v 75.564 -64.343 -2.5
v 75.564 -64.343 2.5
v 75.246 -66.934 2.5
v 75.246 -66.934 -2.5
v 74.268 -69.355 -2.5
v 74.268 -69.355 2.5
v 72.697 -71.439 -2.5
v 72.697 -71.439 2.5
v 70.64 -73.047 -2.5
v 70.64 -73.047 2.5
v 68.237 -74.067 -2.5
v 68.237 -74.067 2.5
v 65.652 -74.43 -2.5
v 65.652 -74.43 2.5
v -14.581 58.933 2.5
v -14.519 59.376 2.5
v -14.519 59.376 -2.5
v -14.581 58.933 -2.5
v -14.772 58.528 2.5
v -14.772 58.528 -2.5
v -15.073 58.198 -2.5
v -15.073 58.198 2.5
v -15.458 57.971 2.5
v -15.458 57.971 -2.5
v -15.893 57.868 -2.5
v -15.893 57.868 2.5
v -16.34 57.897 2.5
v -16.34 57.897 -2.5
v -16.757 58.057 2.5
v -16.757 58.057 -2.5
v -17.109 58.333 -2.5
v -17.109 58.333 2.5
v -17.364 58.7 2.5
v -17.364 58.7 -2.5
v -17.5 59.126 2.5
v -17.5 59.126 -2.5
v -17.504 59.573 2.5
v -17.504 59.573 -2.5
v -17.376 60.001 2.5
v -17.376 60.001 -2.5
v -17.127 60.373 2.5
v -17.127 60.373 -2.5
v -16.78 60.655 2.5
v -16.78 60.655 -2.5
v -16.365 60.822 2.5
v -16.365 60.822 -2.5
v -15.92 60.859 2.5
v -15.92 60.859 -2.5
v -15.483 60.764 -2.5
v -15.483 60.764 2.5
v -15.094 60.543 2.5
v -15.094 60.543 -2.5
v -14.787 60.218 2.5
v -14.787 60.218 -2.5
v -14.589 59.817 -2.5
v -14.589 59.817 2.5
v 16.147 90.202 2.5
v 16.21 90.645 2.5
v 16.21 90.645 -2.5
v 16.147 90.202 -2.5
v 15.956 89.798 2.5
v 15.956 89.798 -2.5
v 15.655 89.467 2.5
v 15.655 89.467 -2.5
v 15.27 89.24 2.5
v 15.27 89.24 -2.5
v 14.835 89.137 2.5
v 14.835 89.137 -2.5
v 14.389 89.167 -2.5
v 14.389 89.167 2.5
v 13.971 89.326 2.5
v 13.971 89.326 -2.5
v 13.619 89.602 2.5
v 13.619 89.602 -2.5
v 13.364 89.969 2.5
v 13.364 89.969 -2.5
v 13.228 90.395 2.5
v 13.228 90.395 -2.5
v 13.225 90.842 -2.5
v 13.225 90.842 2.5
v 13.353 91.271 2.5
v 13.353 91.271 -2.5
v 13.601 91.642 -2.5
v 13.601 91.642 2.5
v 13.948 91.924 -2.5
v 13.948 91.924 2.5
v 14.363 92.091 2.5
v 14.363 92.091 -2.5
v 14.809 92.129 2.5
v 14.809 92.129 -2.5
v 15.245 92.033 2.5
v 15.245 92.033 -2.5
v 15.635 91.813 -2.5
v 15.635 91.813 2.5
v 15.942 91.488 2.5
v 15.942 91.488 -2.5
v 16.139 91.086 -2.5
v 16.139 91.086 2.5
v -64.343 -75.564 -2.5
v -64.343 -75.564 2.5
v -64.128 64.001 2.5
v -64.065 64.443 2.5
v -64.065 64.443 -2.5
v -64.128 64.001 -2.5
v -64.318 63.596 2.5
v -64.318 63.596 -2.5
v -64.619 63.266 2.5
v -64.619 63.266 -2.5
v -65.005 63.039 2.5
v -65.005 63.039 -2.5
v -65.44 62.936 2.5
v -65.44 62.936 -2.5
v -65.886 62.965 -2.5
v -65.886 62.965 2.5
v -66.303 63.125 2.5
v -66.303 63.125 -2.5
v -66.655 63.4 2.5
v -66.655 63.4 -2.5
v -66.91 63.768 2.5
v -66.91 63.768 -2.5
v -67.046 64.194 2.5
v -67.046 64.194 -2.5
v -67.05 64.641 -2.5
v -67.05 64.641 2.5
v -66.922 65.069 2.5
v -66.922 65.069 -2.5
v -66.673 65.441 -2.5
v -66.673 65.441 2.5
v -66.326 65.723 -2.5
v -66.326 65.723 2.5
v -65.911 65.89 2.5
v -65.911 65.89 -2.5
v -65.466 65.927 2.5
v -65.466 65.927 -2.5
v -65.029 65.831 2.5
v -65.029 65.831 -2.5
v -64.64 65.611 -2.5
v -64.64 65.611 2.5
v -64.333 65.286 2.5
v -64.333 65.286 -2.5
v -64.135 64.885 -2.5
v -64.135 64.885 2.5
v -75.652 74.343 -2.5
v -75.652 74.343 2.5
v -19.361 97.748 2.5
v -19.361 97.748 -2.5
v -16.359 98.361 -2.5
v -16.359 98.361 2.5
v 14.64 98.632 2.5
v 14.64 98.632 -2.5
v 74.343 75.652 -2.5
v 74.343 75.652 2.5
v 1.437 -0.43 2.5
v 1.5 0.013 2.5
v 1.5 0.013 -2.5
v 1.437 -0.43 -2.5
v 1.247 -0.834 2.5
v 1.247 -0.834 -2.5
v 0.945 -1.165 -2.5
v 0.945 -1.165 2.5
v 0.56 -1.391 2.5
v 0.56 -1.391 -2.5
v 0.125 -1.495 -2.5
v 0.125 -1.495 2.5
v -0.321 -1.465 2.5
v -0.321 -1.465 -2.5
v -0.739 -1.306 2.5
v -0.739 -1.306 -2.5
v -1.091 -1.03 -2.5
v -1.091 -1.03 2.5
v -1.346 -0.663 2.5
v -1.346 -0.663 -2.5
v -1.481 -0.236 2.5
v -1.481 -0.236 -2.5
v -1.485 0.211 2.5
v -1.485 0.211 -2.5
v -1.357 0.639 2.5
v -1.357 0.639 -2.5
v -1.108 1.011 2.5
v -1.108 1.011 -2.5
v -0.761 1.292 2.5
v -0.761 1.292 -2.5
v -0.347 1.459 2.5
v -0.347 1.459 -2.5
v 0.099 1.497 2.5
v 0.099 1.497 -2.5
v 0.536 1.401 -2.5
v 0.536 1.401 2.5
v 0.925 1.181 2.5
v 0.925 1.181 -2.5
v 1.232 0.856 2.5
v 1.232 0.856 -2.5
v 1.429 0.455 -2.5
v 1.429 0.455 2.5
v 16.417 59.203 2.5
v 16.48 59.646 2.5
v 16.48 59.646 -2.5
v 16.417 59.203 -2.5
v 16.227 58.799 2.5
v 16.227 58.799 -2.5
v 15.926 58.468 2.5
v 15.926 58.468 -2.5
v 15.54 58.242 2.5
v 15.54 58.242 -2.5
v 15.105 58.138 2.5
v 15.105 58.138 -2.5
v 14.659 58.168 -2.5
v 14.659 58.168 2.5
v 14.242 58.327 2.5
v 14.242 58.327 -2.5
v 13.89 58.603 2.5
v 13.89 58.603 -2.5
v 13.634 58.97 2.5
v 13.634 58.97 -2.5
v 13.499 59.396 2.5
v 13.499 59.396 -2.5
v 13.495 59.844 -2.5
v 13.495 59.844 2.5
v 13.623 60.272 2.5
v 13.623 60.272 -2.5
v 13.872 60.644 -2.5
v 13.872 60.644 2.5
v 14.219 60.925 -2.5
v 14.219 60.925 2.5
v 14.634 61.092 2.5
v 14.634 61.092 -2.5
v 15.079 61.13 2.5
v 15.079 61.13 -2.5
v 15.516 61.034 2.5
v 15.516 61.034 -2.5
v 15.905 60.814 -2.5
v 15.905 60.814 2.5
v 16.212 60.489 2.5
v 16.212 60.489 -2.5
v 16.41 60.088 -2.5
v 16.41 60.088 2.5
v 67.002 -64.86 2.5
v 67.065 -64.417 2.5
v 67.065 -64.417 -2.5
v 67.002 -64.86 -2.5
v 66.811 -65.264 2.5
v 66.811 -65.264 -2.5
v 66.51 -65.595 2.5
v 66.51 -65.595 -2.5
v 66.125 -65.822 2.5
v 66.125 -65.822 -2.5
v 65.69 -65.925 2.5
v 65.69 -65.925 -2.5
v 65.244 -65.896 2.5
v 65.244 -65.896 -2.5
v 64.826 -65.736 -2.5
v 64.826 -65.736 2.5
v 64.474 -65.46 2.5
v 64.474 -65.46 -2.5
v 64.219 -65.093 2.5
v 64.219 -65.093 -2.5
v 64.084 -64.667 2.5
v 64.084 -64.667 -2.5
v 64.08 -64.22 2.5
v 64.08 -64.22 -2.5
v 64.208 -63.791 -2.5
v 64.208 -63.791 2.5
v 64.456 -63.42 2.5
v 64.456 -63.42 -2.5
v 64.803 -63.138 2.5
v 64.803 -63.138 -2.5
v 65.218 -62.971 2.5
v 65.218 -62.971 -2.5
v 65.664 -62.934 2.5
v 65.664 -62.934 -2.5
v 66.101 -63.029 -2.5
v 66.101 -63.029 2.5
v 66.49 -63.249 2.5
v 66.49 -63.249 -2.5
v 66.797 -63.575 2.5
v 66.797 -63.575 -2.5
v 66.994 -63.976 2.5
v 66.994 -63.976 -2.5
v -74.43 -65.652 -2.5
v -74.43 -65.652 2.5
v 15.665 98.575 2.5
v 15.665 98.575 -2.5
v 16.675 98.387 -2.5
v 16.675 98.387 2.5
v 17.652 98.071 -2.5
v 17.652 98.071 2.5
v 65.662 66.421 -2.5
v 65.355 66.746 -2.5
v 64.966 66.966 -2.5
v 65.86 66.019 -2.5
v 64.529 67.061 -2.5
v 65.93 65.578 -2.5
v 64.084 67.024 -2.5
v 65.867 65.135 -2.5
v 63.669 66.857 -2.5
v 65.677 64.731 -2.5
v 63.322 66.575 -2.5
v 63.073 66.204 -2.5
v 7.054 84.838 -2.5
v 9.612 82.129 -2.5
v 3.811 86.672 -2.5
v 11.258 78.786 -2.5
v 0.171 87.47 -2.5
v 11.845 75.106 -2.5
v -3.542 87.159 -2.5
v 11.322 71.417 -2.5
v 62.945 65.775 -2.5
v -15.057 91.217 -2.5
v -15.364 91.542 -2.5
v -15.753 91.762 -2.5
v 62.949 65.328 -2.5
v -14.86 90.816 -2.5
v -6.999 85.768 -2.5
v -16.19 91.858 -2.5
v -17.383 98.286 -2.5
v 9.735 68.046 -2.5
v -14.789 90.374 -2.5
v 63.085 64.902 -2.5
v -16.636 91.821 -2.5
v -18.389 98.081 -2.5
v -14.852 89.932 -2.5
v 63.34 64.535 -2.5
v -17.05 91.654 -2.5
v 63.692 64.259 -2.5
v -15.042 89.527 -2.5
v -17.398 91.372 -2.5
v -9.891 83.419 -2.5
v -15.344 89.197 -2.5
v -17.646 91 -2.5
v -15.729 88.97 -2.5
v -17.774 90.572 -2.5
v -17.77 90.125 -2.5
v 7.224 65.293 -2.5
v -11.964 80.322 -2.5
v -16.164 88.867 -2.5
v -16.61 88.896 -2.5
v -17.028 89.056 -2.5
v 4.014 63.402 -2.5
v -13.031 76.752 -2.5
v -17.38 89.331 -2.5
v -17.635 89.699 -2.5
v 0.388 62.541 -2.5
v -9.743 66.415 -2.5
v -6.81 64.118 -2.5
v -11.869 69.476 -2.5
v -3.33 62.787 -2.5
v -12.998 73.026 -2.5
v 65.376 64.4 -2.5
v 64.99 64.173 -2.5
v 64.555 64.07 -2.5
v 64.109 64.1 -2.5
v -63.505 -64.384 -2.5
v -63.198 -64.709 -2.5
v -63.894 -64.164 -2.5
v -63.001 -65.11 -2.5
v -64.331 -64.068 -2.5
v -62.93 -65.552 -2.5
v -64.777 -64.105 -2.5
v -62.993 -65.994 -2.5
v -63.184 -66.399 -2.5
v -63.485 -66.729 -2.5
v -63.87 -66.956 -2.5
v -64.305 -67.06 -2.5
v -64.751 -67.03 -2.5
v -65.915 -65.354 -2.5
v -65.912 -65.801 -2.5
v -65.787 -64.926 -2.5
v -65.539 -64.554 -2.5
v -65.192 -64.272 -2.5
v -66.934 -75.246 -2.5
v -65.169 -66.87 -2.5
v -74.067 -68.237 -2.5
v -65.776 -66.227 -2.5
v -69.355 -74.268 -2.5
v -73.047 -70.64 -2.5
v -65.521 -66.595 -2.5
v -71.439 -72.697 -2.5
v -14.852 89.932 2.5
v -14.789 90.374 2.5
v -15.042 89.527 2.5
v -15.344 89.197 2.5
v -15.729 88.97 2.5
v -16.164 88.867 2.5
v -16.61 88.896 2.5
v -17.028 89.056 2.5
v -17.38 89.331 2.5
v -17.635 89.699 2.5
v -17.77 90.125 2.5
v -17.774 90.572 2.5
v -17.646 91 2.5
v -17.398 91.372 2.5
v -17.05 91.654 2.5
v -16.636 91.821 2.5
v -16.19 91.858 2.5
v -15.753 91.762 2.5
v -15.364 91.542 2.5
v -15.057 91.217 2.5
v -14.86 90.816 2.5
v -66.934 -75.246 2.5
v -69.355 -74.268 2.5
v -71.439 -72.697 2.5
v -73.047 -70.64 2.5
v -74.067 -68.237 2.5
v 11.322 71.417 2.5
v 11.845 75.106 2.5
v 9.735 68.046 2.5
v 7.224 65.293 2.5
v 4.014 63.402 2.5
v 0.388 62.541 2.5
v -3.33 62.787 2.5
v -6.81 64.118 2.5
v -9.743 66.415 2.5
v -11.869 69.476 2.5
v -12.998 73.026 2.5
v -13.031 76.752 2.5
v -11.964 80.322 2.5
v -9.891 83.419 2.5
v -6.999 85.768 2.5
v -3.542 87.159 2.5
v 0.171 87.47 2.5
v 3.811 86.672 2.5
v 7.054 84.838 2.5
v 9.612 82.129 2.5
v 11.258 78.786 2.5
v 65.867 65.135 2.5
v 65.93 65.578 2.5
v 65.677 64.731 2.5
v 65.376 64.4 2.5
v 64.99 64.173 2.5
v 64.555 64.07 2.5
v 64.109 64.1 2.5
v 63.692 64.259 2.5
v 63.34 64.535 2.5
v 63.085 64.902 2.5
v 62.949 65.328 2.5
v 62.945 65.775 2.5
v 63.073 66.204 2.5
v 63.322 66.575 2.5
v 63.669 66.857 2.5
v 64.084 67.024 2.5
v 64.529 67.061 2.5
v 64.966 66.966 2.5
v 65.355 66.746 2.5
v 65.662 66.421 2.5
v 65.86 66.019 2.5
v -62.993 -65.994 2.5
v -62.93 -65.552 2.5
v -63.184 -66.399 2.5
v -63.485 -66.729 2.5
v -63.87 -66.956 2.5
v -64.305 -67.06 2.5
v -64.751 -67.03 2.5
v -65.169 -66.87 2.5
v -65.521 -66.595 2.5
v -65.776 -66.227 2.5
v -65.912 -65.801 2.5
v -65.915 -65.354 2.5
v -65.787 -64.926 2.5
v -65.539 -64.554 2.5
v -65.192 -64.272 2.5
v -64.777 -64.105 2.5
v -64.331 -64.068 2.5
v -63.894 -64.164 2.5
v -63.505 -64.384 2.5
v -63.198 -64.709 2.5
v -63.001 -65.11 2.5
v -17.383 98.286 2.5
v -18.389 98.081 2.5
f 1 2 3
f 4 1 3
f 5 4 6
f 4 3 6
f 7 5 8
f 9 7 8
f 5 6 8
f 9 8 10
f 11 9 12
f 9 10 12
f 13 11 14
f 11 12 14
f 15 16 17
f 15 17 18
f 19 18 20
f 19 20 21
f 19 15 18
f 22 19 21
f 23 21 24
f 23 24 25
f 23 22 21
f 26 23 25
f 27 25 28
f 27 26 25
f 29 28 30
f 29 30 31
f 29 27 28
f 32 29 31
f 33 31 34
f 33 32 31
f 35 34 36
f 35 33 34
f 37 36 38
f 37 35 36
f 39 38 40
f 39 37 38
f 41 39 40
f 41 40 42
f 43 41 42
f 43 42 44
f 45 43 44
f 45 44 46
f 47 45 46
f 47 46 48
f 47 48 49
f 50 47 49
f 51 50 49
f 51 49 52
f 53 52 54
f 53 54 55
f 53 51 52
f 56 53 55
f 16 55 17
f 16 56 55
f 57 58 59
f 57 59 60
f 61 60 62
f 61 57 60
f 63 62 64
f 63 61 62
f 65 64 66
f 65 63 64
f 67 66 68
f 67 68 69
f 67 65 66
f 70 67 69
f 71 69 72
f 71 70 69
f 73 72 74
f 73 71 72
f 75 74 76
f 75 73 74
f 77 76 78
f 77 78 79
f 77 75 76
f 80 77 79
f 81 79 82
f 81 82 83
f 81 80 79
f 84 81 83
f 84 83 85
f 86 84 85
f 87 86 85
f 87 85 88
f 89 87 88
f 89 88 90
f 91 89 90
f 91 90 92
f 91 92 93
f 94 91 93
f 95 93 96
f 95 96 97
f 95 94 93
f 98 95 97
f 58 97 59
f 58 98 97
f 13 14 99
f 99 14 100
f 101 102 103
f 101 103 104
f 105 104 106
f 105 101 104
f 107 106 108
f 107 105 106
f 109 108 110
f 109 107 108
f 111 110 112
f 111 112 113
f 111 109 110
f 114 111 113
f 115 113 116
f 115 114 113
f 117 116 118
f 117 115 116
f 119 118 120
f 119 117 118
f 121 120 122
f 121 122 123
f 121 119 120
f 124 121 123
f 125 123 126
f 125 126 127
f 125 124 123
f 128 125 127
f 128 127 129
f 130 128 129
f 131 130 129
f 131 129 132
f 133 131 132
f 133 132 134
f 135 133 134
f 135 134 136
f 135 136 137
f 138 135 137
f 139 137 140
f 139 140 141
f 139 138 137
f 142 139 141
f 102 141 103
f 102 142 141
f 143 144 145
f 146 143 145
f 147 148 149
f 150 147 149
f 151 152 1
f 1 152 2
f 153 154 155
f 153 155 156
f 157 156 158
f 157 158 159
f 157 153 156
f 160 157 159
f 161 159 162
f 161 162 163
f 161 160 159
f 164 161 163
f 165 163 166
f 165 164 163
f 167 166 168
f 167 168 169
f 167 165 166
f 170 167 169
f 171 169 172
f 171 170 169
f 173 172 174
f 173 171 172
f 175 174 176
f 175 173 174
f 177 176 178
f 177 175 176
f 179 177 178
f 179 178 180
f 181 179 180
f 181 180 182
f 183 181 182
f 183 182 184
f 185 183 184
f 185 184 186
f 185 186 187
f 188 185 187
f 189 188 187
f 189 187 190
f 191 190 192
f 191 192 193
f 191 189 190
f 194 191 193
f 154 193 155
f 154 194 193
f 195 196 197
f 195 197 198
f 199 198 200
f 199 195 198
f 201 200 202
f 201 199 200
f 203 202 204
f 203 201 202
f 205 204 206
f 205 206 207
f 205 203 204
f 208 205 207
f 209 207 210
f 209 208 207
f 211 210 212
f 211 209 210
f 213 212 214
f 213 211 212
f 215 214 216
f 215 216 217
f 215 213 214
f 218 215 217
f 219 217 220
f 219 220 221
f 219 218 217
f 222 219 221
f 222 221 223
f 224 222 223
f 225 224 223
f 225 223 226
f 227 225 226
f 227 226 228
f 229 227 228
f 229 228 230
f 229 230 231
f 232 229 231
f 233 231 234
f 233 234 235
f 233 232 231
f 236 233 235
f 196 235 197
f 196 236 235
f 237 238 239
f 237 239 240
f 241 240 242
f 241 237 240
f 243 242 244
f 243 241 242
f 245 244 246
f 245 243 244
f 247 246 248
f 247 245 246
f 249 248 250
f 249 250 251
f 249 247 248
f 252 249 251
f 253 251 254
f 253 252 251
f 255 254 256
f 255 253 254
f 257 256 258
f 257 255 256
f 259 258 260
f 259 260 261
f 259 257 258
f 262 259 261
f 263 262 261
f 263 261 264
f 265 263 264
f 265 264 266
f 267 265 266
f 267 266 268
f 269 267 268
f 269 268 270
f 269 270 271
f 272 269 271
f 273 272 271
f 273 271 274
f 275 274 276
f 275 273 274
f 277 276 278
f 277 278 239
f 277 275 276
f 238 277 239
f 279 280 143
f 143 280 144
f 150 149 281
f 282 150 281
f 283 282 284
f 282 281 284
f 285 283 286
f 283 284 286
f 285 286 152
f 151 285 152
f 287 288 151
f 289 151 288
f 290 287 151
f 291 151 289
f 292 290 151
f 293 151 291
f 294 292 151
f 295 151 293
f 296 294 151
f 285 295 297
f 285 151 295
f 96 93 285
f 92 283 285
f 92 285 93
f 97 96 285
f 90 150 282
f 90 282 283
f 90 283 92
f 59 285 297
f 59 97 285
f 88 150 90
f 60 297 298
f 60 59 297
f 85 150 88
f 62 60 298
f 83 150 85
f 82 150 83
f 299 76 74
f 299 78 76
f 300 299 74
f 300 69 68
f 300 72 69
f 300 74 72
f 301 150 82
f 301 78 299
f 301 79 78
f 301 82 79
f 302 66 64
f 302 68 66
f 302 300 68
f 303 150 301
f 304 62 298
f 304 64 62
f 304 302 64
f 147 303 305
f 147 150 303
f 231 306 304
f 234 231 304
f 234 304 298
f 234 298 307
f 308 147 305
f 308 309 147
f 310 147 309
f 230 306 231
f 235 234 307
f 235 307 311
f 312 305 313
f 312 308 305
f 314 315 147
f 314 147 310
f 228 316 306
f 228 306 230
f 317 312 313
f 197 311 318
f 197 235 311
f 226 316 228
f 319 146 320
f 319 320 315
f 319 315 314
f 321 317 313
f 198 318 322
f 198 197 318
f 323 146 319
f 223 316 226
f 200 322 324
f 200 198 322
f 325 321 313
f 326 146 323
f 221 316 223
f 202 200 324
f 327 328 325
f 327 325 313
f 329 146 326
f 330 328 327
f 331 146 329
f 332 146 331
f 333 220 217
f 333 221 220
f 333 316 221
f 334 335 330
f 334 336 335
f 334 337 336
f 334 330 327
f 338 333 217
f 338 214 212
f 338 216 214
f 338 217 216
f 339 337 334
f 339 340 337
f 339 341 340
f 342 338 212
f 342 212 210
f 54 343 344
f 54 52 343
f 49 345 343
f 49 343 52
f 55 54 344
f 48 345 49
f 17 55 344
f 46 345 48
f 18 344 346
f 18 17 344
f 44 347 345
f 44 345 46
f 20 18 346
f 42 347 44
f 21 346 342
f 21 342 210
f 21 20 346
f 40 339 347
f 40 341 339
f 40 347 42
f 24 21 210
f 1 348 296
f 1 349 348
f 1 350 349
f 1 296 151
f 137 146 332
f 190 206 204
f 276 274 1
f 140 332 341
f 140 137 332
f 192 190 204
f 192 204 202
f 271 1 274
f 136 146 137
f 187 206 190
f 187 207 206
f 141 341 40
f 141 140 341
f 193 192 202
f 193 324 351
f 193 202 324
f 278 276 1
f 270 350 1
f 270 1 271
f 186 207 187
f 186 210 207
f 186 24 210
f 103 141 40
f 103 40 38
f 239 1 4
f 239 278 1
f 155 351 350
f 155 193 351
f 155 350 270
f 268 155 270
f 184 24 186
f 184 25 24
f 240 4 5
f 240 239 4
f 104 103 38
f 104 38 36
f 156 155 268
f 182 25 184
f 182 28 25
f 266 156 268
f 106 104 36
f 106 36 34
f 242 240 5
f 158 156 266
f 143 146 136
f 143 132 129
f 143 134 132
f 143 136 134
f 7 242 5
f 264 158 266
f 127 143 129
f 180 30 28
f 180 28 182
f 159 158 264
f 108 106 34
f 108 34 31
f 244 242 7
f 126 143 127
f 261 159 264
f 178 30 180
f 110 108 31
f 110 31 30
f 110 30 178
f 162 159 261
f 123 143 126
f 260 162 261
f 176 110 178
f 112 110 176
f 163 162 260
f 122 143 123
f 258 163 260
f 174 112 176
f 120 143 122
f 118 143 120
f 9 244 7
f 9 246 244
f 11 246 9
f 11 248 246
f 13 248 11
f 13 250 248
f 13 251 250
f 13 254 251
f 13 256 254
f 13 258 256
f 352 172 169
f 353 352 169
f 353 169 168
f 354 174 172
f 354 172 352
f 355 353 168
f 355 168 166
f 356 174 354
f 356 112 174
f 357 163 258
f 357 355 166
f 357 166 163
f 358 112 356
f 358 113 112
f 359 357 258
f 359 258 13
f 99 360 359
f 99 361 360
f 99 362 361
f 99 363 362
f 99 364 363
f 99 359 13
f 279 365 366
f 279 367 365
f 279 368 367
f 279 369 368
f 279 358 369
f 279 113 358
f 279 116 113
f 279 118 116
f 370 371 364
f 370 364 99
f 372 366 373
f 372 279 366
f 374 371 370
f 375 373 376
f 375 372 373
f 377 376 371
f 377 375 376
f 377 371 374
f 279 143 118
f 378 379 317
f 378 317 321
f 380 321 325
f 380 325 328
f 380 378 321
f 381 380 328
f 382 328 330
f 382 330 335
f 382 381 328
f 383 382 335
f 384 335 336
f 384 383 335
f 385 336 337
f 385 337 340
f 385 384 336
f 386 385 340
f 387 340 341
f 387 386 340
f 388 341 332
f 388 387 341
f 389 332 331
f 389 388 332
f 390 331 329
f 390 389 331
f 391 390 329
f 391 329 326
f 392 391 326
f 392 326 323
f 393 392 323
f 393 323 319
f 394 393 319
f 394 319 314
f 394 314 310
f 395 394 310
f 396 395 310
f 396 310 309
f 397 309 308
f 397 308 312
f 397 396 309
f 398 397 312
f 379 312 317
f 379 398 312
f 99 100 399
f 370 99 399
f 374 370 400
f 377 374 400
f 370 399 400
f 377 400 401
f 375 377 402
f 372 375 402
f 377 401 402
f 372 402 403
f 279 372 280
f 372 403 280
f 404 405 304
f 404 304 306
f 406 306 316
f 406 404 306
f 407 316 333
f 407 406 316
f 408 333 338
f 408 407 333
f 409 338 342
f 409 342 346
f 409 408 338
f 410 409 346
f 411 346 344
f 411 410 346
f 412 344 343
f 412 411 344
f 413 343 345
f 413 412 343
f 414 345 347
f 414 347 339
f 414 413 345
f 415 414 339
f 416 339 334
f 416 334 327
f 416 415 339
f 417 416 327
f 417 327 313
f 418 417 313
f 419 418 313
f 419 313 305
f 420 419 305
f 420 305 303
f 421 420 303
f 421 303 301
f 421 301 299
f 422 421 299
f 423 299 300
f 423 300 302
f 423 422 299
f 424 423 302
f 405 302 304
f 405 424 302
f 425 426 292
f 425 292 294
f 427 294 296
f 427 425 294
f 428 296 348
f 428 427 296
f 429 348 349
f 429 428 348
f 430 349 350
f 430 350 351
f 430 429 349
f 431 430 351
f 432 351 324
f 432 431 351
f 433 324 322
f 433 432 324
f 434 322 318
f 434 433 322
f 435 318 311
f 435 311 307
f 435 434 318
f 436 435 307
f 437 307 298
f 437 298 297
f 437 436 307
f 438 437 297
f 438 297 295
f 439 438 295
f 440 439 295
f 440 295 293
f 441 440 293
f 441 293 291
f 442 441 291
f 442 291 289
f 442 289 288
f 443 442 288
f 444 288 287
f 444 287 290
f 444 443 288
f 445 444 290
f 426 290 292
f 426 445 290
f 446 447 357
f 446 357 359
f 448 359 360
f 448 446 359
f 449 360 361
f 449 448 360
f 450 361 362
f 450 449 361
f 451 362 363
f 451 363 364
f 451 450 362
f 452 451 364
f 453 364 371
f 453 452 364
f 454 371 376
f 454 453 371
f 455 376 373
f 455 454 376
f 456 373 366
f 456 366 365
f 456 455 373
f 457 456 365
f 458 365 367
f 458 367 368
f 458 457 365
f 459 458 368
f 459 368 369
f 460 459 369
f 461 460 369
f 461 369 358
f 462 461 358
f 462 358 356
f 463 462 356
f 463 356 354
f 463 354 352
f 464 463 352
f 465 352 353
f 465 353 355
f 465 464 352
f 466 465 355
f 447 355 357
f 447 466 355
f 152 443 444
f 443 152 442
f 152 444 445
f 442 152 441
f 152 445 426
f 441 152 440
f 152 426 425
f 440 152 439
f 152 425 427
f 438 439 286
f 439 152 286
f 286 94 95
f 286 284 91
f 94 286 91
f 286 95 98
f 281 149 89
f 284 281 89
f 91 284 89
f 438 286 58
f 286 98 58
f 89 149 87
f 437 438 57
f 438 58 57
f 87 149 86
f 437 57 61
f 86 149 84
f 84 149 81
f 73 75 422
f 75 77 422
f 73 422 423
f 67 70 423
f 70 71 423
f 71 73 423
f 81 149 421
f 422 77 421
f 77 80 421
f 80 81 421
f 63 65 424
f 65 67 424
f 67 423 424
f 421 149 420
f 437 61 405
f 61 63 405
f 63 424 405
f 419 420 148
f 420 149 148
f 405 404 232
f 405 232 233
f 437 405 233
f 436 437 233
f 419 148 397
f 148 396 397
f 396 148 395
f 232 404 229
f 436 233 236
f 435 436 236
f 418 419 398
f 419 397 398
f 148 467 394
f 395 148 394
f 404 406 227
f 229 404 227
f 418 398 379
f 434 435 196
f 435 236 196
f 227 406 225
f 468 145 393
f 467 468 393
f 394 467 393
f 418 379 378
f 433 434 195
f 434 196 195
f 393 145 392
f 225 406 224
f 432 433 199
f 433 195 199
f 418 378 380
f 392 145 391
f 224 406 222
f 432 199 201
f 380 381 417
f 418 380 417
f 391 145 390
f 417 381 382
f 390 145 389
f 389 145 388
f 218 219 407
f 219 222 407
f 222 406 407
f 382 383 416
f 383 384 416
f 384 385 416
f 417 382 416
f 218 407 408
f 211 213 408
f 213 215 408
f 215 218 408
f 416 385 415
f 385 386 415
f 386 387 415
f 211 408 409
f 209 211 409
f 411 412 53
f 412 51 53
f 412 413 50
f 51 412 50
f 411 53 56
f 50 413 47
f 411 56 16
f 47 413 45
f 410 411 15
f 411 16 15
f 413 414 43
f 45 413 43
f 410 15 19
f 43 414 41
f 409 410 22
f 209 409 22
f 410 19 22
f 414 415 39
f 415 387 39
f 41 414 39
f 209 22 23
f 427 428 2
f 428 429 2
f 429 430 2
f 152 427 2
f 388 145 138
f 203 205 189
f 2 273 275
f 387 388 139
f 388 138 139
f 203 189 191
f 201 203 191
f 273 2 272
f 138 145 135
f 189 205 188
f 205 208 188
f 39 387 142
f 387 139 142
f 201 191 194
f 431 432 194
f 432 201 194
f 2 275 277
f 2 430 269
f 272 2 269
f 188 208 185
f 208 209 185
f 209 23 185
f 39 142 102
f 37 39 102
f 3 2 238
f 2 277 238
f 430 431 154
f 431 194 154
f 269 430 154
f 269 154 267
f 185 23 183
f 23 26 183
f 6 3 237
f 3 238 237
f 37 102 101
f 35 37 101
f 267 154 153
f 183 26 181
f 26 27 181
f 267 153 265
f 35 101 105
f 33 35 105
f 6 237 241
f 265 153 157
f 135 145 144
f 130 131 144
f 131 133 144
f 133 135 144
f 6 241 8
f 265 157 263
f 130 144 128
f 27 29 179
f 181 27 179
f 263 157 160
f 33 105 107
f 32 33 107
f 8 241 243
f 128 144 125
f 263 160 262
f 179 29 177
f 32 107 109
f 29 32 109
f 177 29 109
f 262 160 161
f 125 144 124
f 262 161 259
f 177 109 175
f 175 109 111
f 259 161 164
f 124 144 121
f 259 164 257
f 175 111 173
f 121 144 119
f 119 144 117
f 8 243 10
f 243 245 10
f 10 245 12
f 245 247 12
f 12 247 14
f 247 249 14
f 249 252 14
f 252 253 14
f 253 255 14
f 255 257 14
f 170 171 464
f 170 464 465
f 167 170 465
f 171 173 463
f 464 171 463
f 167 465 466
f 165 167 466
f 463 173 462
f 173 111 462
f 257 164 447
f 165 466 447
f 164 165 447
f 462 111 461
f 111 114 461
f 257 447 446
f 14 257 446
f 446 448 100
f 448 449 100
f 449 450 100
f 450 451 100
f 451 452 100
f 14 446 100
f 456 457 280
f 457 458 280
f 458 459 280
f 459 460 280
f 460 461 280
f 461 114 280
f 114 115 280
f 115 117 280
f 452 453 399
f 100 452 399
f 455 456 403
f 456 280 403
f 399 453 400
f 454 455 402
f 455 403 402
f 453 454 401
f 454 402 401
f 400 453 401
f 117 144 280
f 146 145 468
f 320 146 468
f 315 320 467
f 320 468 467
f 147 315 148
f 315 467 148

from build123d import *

# Parameters (mm, degrees)
SKETCH1_R             = 1.5
SKETCH1_R_2           = 12.5
BOSS_EXTRUDE1_DEPTH   = 5
BODY_MOVE_COPY1_ANGLE = 119.711745949


with BuildPart() as part:
    # Sketch1 → Boss-Extrude1 (new body)
    with BuildSketch(Plane(origin=(0, 0, 0), x_dir=(1, 0, 0), z_dir=(0, 1, 0))):
        with BuildLine():
            Line((-75, -75), (65, -75))
            ThreePointArc((65, -75), (72.071067812, -72.071067812), (75, -65))
            Line((75, -65), (75, 65))
            ThreePointArc((75, 65), (72.071067812, 72.071067812), (65, 75))
            Line((65, 75), (-75, 75))
            Line((-75, 75), (-97.913420794, 18.506857518))
            ThreePointArc((-97.913420794, 18.506857518), (-98.351985938, 17.031769181), (-98.5, 15.5))
            Line((-98.5, 15.5), (-98.5, -15.5))
            ThreePointArc((-98.5, -15.5), (-98.351985938, -17.031769181), (-97.913420794, -18.506857518))
            Line((-97.913420794, -18.506857518), (-75, -75))
        make_face()
        with Locations(Location((-90.5, 15.5, 0), (0, 0, 270))):
            Circle(SKETCH1_R, mode=Mode.SUBTRACT)
        with Locations(Location((-90.5, -15.5, 0), (0, 0, 270))):
            Circle(SKETCH1_R, mode=Mode.SUBTRACT)
        with Locations(Location((-59.5, -15.5, 0), (0, 0, 270))):
            Circle(SKETCH1_R, mode=Mode.SUBTRACT)
        with Locations(Location((-59.5, 15.5, 0), (0, 0, 270))):
            Circle(SKETCH1_R, mode=Mode.SUBTRACT)
        with Locations(Location((-75, 0, 0), (0, 0, 270))):
            Circle(SKETCH1_R_2, mode=Mode.SUBTRACT)
        with Locations(Location((-65, 65, 0), (0, 0, 270))):
            Circle(SKETCH1_R, mode=Mode.SUBTRACT)
        with Locations(Location((65, 65, 0), (0, 0, 270))):
            Circle(SKETCH1_R, mode=Mode.SUBTRACT)
        with Locations(Location((65, -65, 0), (0, 0, 270))):
            Circle(SKETCH1_R, mode=Mode.SUBTRACT)
        with Locations(Location((-65, -65, 0), (0, 0, 270))):
            Circle(SKETCH1_R, mode=Mode.SUBTRACT)
        with Locations(Location((0, 0, 0), (0, 0, 270))):
            Circle(SKETCH1_R, mode=Mode.SUBTRACT)
    extrude(amount=BOSS_EXTRUDE1_DEPTH)


with BuildPart() as part_1:
    # Body-Move/Copy1: moved
    add(part.part.moved(Location((0, 0, 0))).rotate(Axis((-6.951895858, -2.256414426, 4.756414426), (-0.5807091426084982, 0.5756634831611324, -0.5756634831615567)), BODY_MOVE_COPY1_ANGLE))


with BuildPart() as part_2:
    # Body-Move/Copy2: moved
    add(part_1.part.moved(Location((11.64746321, 9.2495526, 0))))


solid = part_2.part
